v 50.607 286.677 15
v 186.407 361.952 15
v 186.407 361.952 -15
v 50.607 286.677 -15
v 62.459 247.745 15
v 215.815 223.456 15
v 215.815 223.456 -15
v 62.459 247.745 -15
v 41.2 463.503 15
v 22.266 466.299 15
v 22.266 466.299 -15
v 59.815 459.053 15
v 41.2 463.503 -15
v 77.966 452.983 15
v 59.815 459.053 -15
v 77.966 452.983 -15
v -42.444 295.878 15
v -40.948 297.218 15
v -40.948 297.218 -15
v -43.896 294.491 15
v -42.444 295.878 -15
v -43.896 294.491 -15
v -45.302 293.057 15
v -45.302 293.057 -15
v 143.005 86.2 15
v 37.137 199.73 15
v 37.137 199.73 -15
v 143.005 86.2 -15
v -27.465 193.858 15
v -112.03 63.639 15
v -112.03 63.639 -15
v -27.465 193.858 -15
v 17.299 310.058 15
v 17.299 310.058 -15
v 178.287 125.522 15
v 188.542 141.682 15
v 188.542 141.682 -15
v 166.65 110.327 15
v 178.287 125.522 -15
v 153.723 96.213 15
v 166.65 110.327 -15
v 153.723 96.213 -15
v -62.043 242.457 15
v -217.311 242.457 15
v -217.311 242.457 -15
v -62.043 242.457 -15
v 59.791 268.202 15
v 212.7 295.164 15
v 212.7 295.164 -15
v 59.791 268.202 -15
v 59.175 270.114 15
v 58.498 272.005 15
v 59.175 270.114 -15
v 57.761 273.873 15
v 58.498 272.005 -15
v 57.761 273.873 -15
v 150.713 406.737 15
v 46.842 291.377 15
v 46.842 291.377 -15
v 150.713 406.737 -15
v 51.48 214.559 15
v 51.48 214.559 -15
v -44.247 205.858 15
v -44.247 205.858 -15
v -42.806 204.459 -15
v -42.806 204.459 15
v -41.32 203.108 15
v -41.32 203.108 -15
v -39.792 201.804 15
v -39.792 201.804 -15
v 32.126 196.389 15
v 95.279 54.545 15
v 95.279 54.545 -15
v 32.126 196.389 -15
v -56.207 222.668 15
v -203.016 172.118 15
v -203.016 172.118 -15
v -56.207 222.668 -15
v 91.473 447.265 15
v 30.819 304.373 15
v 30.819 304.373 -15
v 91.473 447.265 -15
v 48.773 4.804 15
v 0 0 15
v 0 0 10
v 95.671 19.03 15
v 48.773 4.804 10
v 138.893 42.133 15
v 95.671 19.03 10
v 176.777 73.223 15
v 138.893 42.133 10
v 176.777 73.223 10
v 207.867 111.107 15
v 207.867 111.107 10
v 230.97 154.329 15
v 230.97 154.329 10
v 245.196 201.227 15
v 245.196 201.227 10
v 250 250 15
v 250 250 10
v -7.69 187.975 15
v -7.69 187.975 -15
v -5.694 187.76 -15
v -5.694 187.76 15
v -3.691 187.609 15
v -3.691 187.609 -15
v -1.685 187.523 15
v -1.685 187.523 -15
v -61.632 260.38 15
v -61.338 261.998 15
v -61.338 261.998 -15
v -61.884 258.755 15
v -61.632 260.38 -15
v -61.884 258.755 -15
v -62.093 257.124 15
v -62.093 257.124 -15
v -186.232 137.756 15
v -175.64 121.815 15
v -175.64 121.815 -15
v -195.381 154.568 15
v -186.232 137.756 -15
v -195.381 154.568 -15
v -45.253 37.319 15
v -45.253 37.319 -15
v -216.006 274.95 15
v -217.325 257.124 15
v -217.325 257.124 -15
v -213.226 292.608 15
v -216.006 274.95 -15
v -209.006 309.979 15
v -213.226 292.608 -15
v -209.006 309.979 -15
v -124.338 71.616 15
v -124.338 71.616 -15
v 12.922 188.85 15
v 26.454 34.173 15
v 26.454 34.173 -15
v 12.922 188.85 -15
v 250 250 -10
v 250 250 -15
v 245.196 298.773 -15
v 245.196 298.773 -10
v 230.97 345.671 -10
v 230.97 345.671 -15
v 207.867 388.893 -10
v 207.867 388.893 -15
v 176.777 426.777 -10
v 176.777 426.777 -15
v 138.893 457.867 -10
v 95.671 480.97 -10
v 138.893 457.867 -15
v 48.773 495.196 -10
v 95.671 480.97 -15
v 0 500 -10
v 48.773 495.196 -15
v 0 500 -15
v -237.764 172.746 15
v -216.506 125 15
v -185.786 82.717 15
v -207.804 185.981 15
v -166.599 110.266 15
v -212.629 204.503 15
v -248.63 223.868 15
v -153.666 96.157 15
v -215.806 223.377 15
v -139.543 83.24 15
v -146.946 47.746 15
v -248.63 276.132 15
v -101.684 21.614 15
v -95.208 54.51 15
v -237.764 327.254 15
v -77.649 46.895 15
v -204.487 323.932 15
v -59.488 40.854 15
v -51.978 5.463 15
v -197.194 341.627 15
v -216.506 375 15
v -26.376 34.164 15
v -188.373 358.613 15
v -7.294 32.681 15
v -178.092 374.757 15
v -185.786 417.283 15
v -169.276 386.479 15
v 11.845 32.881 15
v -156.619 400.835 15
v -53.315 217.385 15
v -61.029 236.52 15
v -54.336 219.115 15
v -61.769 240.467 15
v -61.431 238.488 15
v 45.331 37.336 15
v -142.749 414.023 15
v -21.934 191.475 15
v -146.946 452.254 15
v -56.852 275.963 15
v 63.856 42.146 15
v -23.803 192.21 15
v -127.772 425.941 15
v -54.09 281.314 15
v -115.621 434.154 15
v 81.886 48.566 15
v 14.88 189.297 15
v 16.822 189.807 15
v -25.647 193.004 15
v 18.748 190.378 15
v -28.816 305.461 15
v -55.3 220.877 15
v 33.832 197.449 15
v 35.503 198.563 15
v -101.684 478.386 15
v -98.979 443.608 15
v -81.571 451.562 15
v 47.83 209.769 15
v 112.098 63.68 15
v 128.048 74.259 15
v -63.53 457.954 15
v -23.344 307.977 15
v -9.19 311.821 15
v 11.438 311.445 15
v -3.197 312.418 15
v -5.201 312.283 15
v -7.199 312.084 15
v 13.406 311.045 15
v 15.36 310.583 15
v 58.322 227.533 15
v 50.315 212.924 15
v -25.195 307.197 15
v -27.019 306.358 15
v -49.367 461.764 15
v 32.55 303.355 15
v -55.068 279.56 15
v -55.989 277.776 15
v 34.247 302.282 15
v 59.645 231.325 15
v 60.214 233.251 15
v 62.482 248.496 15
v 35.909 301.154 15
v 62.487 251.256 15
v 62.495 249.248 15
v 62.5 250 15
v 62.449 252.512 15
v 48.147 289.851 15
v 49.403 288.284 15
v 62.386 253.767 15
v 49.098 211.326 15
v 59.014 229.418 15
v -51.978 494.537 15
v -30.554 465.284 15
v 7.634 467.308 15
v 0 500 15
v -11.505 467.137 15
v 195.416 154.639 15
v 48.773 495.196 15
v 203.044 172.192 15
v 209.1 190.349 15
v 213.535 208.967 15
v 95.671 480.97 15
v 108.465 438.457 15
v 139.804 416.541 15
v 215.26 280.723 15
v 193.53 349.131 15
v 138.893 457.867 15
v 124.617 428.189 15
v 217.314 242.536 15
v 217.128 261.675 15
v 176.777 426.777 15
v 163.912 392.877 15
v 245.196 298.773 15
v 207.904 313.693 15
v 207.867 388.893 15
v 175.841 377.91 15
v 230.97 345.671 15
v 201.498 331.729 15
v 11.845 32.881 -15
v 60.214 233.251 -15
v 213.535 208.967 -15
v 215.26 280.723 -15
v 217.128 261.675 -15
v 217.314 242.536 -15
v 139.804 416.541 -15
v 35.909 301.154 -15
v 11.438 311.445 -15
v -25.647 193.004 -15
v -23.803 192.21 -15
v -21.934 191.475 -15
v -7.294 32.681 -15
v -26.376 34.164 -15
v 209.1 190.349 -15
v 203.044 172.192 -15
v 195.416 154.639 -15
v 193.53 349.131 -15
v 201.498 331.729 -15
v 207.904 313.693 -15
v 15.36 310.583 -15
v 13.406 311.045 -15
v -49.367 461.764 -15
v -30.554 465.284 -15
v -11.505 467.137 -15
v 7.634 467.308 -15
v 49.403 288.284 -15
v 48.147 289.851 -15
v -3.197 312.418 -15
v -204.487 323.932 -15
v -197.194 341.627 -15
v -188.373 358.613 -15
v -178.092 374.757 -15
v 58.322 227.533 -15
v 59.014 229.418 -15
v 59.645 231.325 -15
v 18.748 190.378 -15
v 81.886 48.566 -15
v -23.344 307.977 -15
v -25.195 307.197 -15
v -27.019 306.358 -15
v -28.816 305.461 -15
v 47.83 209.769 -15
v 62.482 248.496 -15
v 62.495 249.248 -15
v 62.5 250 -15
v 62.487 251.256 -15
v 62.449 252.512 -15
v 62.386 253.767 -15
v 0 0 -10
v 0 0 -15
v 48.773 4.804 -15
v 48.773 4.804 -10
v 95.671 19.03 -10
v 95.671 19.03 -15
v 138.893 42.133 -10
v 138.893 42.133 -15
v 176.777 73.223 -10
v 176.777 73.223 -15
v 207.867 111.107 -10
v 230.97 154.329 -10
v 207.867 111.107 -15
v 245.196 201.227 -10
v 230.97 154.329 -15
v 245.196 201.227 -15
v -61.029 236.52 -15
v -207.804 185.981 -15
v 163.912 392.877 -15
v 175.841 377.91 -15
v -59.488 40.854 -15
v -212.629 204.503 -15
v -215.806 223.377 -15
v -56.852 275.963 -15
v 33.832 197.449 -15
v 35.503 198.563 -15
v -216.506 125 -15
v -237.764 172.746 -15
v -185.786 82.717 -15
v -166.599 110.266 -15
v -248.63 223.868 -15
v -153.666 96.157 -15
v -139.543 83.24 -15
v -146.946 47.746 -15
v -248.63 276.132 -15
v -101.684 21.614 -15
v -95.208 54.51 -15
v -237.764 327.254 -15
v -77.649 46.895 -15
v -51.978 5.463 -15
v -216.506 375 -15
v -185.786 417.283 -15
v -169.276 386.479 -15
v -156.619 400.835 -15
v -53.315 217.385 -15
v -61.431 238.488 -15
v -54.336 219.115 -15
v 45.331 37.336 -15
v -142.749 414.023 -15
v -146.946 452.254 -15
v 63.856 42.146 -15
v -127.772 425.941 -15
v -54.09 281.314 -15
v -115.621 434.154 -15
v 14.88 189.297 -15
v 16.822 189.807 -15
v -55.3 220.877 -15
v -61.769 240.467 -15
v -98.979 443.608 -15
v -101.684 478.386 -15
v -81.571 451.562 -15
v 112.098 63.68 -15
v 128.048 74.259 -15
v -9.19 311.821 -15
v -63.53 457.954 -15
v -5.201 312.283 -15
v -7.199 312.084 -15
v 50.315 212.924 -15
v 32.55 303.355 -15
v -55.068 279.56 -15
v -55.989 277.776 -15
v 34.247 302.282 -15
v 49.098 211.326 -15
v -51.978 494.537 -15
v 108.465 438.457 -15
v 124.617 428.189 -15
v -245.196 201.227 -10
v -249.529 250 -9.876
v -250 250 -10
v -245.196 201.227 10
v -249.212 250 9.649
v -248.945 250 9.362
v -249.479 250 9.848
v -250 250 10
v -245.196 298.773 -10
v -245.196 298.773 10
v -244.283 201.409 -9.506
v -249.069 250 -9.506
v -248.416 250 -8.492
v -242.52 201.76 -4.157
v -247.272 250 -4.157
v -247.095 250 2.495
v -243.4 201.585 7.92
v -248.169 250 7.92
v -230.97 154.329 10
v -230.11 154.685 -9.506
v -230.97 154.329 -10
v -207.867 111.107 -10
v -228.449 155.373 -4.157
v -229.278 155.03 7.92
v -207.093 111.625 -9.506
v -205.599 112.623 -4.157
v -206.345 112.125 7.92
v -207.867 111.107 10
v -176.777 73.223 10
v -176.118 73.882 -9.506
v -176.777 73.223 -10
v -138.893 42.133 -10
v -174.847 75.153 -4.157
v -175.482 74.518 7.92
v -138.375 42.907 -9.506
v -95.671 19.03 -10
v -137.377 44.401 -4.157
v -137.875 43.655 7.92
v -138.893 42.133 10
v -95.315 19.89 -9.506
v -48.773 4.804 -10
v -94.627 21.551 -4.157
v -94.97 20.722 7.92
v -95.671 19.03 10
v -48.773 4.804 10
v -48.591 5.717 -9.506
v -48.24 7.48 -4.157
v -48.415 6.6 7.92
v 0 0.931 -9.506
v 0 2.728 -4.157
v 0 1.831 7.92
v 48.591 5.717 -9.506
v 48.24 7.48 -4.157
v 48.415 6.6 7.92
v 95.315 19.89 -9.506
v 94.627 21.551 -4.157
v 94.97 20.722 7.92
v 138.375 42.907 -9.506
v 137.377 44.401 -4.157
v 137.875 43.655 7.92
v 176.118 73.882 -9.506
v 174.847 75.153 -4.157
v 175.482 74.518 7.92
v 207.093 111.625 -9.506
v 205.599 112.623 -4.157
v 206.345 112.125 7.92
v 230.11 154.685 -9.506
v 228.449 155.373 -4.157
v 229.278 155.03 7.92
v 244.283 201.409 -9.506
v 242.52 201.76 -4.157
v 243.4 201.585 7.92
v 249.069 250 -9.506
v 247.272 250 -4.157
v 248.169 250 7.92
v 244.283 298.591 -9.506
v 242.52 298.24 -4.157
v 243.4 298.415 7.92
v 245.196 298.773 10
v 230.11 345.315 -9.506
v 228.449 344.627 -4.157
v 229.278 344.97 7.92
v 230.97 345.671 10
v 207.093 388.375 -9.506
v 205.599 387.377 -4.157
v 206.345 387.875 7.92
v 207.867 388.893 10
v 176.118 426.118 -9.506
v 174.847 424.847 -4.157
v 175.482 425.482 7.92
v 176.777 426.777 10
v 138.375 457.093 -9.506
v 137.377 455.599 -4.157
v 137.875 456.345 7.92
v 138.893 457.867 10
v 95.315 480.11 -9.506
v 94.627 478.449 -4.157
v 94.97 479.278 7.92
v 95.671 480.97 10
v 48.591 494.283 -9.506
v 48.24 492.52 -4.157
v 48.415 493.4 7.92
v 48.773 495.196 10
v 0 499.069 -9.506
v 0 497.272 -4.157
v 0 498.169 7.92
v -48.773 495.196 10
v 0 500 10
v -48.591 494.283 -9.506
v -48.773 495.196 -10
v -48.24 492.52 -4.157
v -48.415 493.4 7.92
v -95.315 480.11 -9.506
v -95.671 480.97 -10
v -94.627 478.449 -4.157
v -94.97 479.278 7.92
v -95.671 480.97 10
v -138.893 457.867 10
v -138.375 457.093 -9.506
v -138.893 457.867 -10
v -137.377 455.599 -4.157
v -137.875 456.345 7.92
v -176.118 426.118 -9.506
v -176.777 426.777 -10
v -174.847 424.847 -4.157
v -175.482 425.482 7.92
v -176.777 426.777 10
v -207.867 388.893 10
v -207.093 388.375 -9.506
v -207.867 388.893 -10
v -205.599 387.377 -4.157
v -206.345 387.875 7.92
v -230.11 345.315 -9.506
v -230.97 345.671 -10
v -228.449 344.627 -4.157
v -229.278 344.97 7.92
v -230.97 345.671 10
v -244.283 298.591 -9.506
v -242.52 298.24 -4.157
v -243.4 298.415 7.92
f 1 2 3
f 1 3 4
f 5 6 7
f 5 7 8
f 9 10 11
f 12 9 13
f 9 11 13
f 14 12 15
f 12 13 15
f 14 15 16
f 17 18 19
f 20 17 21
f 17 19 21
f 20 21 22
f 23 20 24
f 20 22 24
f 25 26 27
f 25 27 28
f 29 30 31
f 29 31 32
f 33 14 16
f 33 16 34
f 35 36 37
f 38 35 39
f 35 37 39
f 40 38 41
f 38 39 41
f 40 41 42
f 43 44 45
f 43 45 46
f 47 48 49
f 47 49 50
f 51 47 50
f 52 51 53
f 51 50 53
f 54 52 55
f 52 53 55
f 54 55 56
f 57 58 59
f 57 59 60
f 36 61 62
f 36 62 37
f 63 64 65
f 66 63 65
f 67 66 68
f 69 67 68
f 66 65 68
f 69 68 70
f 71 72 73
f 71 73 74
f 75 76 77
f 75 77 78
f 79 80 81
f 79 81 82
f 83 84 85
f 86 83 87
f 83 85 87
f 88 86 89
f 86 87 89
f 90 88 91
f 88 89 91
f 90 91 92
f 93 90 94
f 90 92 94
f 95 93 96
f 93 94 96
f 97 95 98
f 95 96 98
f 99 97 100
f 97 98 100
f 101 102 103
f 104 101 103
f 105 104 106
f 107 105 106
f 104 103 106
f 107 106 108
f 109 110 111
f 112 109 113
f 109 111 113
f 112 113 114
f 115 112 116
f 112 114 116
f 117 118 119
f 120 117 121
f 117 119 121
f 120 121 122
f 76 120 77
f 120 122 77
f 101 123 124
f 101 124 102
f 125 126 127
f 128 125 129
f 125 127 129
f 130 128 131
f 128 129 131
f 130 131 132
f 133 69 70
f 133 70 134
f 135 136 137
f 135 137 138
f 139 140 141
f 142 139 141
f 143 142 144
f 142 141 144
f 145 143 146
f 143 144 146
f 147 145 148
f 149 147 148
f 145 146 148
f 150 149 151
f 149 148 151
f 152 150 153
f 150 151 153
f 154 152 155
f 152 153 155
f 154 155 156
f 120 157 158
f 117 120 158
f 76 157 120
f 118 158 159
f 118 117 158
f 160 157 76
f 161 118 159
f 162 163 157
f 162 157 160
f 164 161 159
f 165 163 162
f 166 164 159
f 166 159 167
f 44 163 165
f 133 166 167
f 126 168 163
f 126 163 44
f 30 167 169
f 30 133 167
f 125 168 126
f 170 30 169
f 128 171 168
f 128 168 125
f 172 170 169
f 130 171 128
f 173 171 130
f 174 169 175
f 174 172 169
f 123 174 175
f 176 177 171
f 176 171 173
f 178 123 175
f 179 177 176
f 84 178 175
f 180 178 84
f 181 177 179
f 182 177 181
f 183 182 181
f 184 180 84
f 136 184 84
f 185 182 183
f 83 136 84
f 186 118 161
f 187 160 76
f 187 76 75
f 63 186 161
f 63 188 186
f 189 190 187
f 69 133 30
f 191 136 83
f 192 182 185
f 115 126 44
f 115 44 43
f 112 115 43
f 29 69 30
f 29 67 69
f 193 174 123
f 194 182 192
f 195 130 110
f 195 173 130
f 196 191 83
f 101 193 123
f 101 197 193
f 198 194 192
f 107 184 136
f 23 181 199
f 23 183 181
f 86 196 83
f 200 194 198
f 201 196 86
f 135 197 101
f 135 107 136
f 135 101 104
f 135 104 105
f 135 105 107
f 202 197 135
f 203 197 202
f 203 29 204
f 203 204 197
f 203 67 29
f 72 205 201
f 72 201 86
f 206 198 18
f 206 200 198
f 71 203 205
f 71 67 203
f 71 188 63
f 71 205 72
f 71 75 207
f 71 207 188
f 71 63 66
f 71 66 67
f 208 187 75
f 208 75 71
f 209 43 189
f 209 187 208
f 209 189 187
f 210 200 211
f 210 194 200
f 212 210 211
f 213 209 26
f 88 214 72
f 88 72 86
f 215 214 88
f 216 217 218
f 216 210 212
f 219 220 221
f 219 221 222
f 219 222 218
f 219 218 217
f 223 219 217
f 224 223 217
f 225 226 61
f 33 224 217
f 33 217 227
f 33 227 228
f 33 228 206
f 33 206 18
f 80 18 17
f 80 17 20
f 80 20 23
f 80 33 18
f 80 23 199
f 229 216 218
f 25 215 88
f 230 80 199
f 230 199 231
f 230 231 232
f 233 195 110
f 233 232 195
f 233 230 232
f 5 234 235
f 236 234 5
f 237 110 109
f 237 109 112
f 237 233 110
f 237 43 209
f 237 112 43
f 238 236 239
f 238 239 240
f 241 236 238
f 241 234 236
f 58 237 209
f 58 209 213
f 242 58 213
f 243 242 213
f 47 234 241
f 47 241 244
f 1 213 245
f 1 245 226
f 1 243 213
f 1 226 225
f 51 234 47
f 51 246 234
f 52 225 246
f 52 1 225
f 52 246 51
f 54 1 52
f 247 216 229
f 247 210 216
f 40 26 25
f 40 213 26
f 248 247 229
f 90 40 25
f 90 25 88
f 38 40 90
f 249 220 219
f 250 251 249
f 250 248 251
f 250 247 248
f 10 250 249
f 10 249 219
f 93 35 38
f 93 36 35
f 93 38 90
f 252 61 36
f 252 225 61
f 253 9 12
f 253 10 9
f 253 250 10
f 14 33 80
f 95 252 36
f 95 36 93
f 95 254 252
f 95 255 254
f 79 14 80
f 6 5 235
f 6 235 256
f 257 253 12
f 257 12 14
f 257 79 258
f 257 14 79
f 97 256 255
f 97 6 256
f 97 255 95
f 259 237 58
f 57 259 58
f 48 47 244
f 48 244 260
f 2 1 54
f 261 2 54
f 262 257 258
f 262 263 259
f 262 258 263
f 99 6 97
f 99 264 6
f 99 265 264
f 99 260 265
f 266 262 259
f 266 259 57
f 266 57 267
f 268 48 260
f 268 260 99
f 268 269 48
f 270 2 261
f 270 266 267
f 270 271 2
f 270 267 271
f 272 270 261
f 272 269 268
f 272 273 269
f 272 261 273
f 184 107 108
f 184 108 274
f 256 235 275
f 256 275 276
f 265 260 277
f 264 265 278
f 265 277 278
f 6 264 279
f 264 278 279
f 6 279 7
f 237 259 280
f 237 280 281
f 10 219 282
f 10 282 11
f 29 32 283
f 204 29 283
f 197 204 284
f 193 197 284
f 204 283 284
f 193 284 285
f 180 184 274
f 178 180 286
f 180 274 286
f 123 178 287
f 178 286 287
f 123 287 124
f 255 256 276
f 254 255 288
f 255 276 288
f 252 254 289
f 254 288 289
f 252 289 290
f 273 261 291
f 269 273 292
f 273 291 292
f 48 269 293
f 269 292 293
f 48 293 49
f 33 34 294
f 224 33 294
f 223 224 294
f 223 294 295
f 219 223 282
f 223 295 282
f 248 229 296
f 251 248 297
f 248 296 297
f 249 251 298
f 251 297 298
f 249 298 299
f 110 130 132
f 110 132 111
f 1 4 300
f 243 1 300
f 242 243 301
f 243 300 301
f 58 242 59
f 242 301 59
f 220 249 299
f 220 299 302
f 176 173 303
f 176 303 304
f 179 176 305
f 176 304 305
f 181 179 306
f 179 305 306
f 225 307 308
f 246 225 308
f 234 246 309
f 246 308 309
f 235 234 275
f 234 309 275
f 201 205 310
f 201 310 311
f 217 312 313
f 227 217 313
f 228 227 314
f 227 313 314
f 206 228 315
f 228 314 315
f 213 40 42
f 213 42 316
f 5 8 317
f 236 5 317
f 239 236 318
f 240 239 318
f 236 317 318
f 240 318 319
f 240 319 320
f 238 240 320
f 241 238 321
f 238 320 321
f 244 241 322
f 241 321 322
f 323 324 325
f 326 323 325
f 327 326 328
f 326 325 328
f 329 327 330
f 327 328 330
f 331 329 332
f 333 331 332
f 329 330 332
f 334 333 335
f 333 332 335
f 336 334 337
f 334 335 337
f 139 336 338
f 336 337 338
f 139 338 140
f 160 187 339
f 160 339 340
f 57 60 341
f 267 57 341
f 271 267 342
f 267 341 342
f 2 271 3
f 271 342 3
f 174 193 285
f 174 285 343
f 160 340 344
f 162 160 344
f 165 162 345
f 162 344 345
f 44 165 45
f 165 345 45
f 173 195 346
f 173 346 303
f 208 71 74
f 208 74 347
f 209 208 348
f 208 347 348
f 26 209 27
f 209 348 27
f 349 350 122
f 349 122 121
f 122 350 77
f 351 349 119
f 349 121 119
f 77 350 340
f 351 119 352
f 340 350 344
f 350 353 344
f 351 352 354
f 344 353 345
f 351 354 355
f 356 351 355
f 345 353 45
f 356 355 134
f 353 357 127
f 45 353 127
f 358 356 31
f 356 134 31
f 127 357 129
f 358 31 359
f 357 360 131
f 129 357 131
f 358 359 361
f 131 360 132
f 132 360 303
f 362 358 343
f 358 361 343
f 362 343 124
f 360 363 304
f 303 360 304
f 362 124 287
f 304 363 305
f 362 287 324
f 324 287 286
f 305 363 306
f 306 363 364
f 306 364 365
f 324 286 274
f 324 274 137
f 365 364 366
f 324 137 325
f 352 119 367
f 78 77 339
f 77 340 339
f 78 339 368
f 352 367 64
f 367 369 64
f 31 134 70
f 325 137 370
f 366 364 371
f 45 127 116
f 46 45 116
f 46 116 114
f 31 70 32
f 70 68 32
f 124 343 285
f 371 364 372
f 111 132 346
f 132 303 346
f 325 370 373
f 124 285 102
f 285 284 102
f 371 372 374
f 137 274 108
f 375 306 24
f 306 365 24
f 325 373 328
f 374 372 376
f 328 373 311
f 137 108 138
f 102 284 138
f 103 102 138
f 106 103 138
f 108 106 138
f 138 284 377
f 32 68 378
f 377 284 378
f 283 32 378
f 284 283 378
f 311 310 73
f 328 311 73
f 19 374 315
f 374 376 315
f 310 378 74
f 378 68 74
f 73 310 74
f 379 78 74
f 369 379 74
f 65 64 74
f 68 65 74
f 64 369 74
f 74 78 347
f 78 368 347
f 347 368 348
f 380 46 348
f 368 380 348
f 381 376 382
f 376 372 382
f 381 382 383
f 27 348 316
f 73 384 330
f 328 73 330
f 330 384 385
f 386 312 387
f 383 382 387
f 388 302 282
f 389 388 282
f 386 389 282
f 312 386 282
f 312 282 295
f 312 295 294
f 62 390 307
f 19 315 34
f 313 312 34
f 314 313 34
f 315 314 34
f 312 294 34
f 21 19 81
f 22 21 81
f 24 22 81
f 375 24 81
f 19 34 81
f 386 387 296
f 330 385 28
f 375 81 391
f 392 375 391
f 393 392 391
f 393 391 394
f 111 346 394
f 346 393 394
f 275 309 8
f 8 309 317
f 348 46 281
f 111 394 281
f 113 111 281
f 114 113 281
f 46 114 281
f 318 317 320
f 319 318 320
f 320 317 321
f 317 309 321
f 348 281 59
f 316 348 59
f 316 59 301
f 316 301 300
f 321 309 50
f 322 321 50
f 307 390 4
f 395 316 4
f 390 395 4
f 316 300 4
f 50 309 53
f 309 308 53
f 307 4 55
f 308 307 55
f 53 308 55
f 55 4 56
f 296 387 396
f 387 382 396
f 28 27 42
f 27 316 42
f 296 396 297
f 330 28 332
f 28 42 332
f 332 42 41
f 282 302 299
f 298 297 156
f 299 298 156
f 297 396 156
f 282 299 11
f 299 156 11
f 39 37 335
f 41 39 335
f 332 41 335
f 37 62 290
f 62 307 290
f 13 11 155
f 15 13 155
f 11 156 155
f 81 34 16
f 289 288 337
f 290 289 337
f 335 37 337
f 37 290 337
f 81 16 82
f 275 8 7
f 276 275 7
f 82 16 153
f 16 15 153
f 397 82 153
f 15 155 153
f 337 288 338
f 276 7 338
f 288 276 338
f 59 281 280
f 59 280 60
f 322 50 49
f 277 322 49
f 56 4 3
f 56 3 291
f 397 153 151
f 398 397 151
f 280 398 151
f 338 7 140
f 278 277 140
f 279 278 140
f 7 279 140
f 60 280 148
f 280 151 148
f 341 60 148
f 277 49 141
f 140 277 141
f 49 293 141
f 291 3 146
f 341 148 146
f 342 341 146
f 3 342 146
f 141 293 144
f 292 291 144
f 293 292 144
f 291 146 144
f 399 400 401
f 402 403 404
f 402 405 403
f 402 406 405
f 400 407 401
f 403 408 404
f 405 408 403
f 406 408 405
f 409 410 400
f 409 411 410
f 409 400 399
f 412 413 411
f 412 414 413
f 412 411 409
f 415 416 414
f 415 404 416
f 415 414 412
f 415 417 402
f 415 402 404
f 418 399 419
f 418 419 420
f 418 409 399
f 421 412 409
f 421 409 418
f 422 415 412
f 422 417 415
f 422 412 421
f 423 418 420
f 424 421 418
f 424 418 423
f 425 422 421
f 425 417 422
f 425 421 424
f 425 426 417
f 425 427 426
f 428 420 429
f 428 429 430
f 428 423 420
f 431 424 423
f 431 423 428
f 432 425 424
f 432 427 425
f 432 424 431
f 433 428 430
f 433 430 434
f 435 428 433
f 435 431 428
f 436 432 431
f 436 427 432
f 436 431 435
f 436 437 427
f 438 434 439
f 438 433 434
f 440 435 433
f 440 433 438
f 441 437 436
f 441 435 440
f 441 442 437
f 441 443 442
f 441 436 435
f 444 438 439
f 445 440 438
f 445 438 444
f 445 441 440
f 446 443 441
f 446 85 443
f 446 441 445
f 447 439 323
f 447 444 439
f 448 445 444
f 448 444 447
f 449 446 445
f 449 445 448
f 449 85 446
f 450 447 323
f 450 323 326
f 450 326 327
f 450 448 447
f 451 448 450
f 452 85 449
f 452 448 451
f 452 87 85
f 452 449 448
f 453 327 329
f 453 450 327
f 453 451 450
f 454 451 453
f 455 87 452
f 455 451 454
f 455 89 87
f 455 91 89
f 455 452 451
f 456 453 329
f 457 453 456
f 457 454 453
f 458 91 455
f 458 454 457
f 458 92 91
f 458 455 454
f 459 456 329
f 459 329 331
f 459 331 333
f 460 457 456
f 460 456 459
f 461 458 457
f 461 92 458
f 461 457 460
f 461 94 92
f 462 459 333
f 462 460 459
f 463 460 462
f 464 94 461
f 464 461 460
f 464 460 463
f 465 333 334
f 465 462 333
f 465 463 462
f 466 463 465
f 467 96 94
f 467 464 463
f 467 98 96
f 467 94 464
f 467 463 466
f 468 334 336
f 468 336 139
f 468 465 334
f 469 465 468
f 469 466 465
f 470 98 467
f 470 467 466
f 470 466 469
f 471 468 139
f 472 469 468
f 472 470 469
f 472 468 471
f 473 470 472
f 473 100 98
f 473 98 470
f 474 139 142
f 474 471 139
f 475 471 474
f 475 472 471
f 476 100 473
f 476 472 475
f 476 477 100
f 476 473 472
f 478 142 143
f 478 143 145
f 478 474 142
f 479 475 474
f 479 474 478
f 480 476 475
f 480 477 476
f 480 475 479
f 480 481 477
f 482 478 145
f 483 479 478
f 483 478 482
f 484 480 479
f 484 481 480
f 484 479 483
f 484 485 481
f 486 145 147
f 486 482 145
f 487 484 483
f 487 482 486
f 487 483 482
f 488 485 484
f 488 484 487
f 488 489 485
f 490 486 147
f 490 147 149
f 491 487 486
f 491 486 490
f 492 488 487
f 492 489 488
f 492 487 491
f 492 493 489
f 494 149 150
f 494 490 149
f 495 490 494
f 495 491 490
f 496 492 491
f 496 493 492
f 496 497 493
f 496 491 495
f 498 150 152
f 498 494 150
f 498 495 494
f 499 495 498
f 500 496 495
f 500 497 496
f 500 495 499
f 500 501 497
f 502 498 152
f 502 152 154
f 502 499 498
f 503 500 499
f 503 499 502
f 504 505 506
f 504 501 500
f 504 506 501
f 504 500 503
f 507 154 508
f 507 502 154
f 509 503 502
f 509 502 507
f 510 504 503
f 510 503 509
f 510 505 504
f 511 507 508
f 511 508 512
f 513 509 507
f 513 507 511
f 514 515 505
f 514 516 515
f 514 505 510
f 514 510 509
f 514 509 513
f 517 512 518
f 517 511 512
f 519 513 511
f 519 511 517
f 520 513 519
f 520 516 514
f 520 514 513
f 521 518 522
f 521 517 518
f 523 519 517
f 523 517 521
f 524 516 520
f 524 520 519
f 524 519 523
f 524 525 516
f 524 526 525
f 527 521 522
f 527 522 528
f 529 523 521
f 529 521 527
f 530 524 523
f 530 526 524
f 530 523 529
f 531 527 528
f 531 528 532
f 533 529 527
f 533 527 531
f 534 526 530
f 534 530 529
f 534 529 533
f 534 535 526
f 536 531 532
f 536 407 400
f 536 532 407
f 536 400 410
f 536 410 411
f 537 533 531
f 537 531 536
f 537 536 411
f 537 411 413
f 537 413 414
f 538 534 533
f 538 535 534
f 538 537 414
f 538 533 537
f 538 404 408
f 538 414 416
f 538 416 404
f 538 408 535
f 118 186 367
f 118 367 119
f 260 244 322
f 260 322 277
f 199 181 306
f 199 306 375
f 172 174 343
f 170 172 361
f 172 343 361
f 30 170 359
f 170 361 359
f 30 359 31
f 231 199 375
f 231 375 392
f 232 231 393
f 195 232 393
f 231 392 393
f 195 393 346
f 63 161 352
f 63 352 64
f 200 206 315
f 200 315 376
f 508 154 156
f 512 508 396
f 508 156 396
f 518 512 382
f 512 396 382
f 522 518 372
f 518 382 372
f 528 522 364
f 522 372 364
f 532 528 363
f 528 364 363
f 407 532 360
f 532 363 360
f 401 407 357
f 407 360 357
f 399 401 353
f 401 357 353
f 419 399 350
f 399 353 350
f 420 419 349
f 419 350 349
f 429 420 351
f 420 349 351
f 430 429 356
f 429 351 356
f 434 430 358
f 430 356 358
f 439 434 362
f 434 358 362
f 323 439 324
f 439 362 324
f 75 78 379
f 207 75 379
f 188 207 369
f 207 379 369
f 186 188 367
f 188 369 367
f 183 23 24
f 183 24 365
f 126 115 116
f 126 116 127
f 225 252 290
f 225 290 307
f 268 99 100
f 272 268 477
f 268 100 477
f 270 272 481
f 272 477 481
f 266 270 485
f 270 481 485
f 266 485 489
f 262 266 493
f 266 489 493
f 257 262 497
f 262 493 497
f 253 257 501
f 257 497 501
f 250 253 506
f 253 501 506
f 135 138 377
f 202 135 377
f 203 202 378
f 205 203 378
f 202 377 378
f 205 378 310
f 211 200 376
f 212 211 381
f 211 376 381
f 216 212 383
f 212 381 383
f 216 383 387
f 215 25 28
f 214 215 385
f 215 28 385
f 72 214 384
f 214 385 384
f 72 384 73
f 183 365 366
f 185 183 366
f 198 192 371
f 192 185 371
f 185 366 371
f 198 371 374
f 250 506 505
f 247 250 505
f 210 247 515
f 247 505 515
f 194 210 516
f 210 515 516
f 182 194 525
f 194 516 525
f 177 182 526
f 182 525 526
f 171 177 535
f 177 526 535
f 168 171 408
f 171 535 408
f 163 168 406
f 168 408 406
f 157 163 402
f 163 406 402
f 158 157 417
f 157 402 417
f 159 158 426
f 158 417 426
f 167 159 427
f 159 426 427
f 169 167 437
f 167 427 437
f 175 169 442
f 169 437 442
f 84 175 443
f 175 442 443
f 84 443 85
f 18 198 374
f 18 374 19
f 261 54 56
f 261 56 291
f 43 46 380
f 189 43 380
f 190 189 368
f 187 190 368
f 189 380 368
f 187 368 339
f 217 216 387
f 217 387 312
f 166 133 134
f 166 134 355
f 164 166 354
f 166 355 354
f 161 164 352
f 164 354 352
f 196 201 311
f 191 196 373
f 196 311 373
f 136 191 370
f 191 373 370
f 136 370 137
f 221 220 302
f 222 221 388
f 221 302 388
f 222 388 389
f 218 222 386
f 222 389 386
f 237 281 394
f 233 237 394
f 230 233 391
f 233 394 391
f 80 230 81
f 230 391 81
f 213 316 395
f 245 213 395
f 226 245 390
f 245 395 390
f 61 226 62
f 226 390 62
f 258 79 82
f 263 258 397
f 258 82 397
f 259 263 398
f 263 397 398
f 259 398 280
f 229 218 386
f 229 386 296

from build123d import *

# Parameters (mm, degrees)
BOSS_EXTRUDE1_DEPTH      = 15
BOSS_EXTRUDE1_DEPTH_BACK = 15
BOSS_EXTRUDE2_DEPTH      = 30
CIRPATTERN1_COUNT        = 19
CIRPATTERN1_ANGLE        = 342


with BuildPart() as part:
    # Sketch2 → Boss-Extrude1 (new, two sides: drawn at the far end of the back side and taken through both)
    with BuildSketch(Plane.XY.offset(-BOSS_EXTRUDE1_DEPTH_BACK)):
        with BuildLine():
            ThreePointArc((0, 32.558207974), (-217.441792026, 250), (0, 467.441792026))
            Line((0, 467.441792026), (0, 500))
            ThreePointArc((0, 500), (-250, 250), (0, 0))
            Line((0, 0), (0, 32.558207974))
        make_face()
        with BuildLine():
            Line((0, 500), (0, 467.441792026))
            ThreePointArc((0, 467.441792026), (153.754565655, 403.754565655), (217.441792026, 250))
            ThreePointArc((217.441792026, 250), (153.754565655, 96.245434345), (0, 32.558207974))
            Line((0, 32.558207974), (0, 0))
            ThreePointArc((0, 0), (176.776695297, 73.223304703), (250, 250))
            ThreePointArc((250, 250), (176.776695297, 426.776695297), (0, 500))
        make_face()
        with BuildLine():
            Line((0, 312.5), (0, 260))
            Line((0, 260), (0, 240))
            Line((0, 240), (0, 187.5))
            ThreePointArc((0, 187.5), (44.194173824, 205.805826176), (62.5, 250))
            ThreePointArc((62.5, 250), (44.194173824, 294.194173824), (0, 312.5))
        make_face()
        with BuildLine():
            Line((0, 240), (0, 260))
            Line((0, 260), (0, 312.5))
            ThreePointArc((0, 312.5), (-62.5, 250), (0, 187.5))
            Line((0, 187.5), (0, 240))
        make_face()
    extrude(amount=BOSS_EXTRUDE1_DEPTH + BOSS_EXTRUDE1_DEPTH_BACK)

    # Sketch4 → Boss-Extrude2 (add)
    with BuildSketch(Plane.XY.offset(15)):
        with BuildLine():
            ThreePointArc((-62.043119193, 242.456700933), (-62.499642772, 249.788686637), (-62.092708437, 257.123591721))
            Line((-62.092708437, 257.123591721), (-217.325073014, 257.123591721))
            add(Edge.make_bspline(
                [(-217.325073014, 257.123591721), (-218.805807348, 249.792999154), (-217.310909893, 242.456700933)],
                knots=[0, 0, 0, 1, 1, 1], degree=2))
            Line((-217.310909893, 242.456700933), (-62.043119193, 242.456700933))
        make_face()
    boss_extrude2 = extrude(amount=-BOSS_EXTRUDE2_DEPTH)

    # CirPattern1: Boss-Extrude2 ×19 about axis
    cirpattern1_axis = Axis((0, 250, 0), (0, 0, 1))
    for i in range(1, CIRPATTERN1_COUNT):
        add(boss_extrude2.rotate(cirpattern1_axis, i * CIRPATTERN1_ANGLE / (CIRPATTERN1_COUNT - 1)))

    # Sketch1 → Cut-Revolve1 (revolve, cut)
    with BuildSketch(Plane(origin=(0, 0, 0), x_dir=(0, 0, -1), z_dir=(1, 0, 0)), mode=Mode.PRIVATE) as cut_revolve1_sk:
        with BuildLine():
            Line((-10, 0), (-10, -1.402735917))
            Line((-10, -1.402735917), (10, -1.402735917))
            Line((10, -1.402735917), (10, 0))
            add(Edge.make_bspline(
                [(10, 0), (10, 3), (0, 3), (-10, 3), (-10, 0)],
                knots=[0, 0, 0, 1.570796327, 1.570796327, 3.141592654, 3.141592654, 3.141592654], degree=2, weights=[1, 0.707106781, 1, 0.707106781, 1]))
        make_face()
    revolve(cut_revolve1_sk.sketch.rotate(Axis((0, 250, 0), (0, 0, 1)), 270), axis=Axis((0, 250, 0), (0, 0, 1)), mode=Mode.SUBTRACT)


solid = part.part
